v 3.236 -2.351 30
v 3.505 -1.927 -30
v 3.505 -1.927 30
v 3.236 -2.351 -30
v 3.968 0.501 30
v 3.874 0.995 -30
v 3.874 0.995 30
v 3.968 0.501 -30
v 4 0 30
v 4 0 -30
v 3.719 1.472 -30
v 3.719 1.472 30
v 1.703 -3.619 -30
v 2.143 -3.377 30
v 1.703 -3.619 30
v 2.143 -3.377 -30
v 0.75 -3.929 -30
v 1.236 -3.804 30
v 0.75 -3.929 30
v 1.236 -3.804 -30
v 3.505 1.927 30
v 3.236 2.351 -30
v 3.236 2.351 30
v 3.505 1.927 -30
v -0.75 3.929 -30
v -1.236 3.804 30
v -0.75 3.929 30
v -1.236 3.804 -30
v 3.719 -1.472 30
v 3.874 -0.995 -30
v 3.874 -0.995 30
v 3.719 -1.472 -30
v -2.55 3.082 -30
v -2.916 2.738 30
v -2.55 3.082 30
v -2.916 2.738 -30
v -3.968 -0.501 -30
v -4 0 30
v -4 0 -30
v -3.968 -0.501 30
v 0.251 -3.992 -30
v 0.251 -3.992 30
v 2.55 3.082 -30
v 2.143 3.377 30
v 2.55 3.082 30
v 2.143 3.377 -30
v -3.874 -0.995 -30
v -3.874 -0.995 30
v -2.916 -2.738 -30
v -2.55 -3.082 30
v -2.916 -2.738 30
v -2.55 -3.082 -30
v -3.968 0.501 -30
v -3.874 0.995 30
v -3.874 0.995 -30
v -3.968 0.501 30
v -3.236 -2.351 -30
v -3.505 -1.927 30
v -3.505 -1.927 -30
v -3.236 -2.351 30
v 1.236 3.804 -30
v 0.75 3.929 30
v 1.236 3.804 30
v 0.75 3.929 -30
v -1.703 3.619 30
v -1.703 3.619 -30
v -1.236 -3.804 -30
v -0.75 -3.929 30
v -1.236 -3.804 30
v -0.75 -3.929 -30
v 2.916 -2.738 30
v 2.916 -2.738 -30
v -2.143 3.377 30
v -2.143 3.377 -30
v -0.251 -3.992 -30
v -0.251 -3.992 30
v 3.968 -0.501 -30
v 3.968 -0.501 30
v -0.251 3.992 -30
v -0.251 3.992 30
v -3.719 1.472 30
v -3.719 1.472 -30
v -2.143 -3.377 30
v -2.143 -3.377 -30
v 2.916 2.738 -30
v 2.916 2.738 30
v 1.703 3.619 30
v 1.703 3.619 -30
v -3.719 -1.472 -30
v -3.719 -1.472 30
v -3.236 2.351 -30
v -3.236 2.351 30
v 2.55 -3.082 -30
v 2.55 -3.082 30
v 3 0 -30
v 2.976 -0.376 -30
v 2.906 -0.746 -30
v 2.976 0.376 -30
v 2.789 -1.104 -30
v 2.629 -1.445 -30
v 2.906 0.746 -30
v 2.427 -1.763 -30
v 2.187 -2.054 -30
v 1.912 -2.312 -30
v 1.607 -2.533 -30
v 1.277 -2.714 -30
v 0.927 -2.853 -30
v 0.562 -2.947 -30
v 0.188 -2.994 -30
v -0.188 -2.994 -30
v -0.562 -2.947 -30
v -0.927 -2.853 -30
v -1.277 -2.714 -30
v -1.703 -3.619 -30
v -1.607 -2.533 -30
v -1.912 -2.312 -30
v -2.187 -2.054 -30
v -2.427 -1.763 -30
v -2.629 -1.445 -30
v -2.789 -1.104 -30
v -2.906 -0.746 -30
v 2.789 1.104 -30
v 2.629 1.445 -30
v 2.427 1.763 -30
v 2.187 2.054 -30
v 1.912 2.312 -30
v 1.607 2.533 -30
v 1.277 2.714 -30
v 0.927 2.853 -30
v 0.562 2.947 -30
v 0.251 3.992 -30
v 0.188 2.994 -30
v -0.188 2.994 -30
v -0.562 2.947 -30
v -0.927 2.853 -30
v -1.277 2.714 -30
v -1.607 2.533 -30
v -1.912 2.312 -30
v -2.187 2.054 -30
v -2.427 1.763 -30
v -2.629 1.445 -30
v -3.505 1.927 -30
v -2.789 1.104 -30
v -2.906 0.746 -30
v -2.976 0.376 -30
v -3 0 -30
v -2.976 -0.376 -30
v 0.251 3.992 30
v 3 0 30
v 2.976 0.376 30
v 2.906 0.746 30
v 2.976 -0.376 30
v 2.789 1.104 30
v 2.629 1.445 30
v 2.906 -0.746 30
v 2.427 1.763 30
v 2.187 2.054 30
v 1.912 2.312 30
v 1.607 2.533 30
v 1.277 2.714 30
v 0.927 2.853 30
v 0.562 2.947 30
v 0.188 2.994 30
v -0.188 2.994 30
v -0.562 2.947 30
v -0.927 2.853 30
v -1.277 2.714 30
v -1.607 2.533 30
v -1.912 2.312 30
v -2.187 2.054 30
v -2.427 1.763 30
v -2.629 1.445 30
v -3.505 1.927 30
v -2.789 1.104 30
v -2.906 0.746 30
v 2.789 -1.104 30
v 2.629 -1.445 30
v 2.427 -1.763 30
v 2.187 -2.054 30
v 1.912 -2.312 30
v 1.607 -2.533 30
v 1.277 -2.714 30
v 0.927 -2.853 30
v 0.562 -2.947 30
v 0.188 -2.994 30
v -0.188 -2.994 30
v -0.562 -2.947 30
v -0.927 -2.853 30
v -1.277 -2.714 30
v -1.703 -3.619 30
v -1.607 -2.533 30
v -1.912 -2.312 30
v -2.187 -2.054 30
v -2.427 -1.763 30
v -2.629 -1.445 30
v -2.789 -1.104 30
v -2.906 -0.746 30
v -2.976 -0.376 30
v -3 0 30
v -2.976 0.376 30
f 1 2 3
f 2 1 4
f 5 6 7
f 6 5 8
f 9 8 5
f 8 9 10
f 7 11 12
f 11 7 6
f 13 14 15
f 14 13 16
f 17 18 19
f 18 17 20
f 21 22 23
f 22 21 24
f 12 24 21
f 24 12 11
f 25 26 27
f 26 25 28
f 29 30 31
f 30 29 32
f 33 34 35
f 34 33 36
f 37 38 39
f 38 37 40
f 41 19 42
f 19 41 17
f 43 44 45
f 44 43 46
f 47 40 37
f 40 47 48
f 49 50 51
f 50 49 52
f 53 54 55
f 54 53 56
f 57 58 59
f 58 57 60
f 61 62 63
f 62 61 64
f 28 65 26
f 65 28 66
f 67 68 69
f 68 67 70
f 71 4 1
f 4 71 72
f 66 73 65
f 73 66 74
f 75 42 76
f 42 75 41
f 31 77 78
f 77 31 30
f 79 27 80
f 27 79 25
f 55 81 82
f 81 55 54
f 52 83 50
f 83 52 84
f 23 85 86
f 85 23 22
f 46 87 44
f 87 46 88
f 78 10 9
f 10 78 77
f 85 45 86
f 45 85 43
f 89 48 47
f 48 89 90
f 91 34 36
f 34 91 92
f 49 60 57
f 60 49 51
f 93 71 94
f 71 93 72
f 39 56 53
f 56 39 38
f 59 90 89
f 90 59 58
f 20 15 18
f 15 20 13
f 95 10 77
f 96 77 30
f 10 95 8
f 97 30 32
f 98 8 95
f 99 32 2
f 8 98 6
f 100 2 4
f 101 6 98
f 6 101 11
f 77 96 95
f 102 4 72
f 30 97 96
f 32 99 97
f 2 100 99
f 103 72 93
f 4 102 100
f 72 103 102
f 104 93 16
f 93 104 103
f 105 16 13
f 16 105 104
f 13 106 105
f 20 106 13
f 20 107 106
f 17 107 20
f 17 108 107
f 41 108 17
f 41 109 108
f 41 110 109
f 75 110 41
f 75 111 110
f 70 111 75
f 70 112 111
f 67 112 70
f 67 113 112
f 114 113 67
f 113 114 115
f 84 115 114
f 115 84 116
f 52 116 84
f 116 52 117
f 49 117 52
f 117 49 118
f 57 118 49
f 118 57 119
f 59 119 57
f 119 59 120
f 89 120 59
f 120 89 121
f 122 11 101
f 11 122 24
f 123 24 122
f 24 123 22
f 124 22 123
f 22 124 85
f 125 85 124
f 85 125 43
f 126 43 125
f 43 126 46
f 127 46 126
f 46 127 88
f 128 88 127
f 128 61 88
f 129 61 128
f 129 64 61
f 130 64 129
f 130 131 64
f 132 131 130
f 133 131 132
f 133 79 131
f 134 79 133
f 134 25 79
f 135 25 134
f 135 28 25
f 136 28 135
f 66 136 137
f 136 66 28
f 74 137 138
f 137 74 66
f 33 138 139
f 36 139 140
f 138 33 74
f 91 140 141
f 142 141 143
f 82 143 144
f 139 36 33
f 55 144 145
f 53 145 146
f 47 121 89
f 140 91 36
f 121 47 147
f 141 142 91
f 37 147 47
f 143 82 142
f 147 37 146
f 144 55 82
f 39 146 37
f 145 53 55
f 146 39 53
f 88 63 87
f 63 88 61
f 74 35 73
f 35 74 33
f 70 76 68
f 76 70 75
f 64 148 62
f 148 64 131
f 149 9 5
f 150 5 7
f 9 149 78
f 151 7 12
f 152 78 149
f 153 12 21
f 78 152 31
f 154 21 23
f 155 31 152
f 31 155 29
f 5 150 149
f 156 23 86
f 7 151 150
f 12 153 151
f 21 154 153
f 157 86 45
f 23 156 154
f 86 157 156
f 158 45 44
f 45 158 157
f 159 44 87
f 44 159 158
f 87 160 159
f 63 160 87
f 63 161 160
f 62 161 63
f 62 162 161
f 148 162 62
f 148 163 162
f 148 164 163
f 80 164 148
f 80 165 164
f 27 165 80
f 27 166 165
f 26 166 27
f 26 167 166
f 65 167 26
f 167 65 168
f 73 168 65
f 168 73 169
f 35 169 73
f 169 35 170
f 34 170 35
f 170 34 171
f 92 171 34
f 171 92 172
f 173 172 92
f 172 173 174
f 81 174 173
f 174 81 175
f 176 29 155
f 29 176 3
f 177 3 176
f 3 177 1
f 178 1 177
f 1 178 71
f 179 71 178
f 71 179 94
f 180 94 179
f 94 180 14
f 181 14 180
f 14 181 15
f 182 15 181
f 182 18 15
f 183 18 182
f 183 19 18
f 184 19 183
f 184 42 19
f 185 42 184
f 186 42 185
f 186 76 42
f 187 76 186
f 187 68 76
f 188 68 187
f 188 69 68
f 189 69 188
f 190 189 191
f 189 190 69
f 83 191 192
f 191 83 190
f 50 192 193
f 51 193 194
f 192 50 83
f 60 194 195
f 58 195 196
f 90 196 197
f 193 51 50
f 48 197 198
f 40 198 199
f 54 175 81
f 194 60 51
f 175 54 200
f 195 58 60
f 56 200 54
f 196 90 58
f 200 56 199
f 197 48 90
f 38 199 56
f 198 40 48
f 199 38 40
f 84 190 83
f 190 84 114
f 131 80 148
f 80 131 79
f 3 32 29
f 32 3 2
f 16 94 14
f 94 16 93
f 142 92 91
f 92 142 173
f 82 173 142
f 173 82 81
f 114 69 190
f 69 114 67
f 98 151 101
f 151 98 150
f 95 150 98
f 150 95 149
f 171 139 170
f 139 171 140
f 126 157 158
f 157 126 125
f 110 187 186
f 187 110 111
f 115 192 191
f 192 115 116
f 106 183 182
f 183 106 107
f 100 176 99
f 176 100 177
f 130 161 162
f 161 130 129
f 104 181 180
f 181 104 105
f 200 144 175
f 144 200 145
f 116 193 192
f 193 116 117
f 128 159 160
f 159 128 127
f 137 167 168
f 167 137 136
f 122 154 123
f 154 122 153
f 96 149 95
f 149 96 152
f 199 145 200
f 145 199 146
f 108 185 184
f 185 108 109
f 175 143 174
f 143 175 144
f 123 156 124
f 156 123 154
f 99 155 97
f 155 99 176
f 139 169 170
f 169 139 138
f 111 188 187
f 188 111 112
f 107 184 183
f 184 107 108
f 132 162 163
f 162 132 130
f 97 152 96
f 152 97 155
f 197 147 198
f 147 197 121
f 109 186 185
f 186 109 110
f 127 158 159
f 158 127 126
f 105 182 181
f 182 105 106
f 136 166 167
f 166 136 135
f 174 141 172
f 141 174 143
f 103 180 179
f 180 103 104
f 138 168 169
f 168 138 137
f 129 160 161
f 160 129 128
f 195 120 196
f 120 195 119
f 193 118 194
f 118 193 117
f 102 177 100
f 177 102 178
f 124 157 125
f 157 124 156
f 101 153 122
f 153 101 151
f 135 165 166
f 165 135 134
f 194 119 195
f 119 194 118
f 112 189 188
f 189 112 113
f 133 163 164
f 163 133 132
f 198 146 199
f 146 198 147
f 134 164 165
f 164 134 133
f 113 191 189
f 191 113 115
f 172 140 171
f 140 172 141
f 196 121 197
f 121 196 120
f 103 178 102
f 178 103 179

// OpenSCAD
$fn = 50;


difference() {
	union() {
		translate(v = [0, 0, -30.0000000000]) {
			cylinder(h = 60, r = 4.0000000000);
		}
	}
	union() {
		translate(v = [0, 0, -100.0000000000]) {
			cylinder(h = 200, r = 3.0000000000);
		}
	}
}
